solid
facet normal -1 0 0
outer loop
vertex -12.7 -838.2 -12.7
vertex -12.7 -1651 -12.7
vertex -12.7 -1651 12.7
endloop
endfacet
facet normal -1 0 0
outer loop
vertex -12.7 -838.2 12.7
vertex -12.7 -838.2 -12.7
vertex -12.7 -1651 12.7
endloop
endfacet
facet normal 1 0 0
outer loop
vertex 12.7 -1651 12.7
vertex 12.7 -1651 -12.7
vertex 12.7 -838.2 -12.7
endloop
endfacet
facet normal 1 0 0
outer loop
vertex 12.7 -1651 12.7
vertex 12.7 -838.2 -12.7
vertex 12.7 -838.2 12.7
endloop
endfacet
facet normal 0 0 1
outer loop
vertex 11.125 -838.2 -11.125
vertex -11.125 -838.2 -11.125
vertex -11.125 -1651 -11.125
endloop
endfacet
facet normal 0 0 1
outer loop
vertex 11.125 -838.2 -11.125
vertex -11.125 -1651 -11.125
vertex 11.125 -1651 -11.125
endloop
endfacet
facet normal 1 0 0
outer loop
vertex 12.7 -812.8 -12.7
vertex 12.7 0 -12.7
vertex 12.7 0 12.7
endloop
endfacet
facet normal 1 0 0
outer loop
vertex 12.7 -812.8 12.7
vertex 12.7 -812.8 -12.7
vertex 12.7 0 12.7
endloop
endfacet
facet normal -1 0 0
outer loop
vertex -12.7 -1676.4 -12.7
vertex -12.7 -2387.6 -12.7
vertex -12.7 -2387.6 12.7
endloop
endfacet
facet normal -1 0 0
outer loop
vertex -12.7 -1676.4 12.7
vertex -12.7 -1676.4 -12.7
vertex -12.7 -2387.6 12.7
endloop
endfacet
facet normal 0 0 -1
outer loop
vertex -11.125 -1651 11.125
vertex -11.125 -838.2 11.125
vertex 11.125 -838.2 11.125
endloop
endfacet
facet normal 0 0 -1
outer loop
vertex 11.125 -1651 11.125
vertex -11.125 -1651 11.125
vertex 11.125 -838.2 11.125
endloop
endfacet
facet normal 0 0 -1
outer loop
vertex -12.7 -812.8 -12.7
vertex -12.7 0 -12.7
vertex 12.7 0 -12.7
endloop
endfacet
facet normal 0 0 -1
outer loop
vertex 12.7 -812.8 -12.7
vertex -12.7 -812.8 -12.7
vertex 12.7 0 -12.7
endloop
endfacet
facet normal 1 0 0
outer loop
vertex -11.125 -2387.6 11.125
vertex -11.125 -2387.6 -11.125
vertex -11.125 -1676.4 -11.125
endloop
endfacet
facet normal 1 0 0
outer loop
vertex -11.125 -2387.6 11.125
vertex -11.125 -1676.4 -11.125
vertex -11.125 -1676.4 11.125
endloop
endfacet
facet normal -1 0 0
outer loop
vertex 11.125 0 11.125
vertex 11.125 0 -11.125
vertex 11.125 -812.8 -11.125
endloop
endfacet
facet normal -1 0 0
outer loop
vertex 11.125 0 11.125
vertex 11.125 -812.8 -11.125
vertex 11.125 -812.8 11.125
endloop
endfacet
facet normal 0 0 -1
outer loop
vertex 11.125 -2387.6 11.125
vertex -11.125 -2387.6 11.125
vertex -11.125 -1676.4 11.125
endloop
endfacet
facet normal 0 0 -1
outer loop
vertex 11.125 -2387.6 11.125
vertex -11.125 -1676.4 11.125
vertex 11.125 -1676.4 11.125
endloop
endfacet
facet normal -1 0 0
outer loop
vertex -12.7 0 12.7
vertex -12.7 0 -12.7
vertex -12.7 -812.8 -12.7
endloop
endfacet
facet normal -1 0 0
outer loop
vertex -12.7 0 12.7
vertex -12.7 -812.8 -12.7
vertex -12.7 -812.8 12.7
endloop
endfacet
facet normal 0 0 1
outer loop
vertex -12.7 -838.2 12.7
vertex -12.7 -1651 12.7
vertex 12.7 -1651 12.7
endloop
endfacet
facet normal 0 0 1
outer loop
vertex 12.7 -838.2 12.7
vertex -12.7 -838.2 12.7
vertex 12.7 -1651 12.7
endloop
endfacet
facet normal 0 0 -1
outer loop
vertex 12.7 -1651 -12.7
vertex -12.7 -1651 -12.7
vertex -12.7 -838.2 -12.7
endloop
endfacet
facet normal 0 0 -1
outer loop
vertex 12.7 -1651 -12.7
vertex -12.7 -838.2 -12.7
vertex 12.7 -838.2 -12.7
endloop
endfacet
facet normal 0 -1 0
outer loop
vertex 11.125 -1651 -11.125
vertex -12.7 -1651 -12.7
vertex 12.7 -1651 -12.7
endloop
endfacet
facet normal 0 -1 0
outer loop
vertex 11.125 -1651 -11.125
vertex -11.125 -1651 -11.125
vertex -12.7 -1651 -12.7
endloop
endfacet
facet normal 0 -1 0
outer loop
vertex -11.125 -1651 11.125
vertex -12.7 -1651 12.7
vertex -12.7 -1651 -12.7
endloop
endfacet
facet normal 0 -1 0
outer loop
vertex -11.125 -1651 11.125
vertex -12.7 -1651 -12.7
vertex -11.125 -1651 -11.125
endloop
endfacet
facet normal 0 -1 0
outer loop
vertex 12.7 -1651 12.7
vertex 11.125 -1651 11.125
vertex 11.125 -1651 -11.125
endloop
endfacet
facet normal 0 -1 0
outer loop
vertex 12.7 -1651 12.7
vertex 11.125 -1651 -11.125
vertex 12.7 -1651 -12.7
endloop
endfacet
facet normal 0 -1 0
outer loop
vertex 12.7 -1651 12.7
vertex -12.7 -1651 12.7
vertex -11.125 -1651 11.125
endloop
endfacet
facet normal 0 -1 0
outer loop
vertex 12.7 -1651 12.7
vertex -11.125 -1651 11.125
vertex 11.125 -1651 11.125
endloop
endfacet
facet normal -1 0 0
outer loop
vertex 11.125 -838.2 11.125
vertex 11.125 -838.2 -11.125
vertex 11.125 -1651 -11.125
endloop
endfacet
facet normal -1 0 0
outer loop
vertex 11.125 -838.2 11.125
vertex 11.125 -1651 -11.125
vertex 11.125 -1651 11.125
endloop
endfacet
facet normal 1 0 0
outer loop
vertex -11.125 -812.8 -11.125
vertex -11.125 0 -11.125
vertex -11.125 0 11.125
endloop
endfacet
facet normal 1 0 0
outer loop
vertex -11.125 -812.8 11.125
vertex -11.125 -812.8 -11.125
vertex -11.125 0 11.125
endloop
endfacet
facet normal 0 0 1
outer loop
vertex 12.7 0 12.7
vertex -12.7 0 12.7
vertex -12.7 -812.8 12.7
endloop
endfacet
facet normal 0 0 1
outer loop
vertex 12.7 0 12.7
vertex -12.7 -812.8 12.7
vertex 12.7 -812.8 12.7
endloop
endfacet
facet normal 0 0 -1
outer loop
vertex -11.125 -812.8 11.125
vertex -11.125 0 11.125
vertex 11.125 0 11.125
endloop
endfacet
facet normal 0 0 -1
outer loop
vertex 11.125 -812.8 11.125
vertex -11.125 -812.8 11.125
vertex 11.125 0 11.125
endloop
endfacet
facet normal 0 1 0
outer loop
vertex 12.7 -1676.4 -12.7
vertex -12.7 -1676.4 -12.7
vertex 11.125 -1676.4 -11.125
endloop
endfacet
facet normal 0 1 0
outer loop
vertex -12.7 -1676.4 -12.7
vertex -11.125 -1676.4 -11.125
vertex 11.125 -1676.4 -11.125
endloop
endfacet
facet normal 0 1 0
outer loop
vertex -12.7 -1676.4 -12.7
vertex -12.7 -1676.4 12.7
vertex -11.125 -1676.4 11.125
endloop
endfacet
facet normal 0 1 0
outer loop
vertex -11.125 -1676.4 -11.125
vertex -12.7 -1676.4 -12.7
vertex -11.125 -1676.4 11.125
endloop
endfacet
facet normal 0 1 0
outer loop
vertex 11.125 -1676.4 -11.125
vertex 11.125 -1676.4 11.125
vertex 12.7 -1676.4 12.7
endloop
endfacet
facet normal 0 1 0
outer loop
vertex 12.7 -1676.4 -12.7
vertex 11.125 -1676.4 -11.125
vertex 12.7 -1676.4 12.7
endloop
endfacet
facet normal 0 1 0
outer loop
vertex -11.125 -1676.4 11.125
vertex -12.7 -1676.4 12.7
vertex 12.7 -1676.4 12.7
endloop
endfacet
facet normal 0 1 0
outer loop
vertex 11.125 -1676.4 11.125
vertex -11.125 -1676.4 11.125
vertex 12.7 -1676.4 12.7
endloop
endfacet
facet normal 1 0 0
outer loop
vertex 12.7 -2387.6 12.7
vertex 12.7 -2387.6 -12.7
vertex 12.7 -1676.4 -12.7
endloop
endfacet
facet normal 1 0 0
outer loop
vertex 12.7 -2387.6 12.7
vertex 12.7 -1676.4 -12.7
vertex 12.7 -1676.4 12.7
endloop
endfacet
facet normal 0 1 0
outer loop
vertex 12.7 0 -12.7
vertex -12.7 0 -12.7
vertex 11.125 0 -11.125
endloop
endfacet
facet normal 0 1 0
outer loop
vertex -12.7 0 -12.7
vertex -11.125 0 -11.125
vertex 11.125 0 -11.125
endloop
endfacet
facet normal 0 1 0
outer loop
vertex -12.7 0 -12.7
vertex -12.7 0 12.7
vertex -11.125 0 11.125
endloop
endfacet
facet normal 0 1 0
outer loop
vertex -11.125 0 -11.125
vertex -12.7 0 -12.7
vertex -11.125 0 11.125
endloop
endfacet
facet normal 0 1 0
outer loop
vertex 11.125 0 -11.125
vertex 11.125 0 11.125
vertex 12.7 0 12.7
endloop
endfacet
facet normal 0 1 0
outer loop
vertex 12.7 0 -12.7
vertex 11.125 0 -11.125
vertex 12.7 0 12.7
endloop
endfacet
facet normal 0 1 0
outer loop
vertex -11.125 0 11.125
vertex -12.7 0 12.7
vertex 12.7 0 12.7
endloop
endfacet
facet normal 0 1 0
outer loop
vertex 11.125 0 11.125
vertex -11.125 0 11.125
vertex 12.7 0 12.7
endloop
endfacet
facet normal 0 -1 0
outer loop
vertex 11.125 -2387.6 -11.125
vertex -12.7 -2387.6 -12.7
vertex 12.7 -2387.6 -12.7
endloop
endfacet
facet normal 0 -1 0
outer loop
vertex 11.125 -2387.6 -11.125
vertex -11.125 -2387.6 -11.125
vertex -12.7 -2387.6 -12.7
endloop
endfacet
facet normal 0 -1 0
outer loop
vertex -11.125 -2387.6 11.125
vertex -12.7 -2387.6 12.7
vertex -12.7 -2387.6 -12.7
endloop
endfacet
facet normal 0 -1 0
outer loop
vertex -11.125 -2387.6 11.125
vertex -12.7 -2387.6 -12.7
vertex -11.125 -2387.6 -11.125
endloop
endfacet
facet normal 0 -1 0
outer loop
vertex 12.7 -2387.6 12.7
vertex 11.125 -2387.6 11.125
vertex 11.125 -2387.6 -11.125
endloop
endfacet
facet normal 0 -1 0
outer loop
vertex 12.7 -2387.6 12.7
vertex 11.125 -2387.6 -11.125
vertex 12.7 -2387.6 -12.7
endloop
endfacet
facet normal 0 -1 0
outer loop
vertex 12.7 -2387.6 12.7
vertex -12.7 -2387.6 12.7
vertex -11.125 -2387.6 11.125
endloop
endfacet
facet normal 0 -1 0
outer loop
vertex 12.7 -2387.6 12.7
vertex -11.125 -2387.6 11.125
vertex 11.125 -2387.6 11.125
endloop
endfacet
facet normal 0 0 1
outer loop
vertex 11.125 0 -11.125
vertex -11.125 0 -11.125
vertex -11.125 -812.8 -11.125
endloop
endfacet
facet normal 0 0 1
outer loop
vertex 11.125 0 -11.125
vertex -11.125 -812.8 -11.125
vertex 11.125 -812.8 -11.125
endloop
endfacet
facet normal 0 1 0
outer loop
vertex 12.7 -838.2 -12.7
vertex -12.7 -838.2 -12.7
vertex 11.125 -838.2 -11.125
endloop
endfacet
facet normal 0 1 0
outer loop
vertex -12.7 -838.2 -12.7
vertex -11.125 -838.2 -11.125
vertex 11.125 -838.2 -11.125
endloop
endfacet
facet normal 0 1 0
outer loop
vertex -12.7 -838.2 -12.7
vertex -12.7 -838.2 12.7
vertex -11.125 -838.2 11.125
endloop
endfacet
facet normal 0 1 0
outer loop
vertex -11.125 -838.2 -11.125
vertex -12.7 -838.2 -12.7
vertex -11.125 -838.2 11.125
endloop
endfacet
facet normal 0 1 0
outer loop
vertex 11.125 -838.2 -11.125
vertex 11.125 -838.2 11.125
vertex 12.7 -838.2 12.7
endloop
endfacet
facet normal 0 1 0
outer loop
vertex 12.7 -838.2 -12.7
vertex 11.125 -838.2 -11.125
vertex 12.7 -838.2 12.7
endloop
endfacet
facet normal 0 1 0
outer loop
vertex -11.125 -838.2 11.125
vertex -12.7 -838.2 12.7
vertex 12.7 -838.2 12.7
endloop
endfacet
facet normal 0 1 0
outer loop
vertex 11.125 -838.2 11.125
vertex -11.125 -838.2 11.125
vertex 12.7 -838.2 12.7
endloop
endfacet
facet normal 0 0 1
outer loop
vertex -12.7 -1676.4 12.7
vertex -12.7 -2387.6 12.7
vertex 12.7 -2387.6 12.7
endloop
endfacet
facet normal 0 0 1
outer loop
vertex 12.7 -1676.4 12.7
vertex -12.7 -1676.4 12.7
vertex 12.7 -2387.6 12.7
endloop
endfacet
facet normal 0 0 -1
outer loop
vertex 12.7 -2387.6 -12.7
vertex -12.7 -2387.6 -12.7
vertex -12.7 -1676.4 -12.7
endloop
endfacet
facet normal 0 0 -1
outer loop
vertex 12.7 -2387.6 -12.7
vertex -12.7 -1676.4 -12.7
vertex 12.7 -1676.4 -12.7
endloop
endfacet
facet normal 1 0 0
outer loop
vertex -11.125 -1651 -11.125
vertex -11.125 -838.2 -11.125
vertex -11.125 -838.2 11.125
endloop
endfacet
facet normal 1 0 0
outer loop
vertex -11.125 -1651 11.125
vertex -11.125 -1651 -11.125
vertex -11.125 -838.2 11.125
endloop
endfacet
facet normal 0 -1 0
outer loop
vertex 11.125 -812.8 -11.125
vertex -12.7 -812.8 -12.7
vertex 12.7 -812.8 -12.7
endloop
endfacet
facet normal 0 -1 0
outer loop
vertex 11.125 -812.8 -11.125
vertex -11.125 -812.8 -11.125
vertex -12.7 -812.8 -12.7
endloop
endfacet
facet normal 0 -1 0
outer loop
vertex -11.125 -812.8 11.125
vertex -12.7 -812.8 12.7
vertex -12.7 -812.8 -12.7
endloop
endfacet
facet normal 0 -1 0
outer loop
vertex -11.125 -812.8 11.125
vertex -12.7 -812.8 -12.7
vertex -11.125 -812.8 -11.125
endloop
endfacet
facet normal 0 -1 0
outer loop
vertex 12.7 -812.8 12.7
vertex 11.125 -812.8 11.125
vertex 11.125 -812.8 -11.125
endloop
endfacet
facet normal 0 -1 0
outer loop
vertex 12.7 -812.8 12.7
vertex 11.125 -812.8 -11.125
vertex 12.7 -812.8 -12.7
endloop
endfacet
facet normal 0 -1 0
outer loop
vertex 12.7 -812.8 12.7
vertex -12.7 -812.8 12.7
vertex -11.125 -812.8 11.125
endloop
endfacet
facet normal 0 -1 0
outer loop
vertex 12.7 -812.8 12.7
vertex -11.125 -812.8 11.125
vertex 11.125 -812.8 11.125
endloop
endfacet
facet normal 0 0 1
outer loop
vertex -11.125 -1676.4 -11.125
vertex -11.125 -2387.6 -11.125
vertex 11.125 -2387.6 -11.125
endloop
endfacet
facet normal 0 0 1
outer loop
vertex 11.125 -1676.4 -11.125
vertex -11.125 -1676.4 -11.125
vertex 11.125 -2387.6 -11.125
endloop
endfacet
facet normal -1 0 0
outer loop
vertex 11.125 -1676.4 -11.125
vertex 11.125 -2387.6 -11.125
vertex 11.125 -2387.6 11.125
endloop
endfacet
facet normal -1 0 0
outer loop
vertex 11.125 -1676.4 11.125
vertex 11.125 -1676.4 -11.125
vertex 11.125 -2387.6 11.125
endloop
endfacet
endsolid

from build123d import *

# Parameters (mm, degrees)
F0_W     = 25.4
F0_H     = 25.4
F0_W_2   = 22.2504
F0_H_2   = 22.2504
F1_DEPTH = 812.8
F3_START = 25.4
F2_W     = 25.4
F2_H     = 25.4
F2_W_2   = 22.2504
F2_H_2   = 22.2504
F3_DEPTH = 812.8
F5_START = 25.4
F4_W     = 25.4
F4_H     = 25.4
F4_W_2   = 22.2504
F4_H_2   = 22.2504
F5_DEPTH = 711.2


with BuildPart() as f1:
    # F0 (on Front) → F1 (new body)
    with BuildSketch(Plane.XZ):
        Rectangle(F0_W, F0_H)
        Rectangle(F0_W_2, F0_H_2, mode=Mode.SUBTRACT)
    extrude(amount=F1_DEPTH)


with BuildPart() as f3:
    # F2 (on face) → F3 (new body)
    with BuildSketch(Plane.XZ.offset(812.8).offset(F3_START)):
        Rectangle(F2_W, F2_H)
        Rectangle(F2_W_2, F2_H_2, mode=Mode.SUBTRACT)
    extrude(amount=F3_DEPTH)


with BuildPart() as f5:
    # F4 (on face) → F5 (new body)
    with BuildSketch(Plane.XZ.offset(1651).offset(F5_START)):
        Rectangle(F4_W, F4_H)
        Rectangle(F4_W_2, F4_H_2, mode=Mode.SUBTRACT)
    extrude(amount=F5_DEPTH)


solid = Compound([f1.part, f3.part, f5.part])
